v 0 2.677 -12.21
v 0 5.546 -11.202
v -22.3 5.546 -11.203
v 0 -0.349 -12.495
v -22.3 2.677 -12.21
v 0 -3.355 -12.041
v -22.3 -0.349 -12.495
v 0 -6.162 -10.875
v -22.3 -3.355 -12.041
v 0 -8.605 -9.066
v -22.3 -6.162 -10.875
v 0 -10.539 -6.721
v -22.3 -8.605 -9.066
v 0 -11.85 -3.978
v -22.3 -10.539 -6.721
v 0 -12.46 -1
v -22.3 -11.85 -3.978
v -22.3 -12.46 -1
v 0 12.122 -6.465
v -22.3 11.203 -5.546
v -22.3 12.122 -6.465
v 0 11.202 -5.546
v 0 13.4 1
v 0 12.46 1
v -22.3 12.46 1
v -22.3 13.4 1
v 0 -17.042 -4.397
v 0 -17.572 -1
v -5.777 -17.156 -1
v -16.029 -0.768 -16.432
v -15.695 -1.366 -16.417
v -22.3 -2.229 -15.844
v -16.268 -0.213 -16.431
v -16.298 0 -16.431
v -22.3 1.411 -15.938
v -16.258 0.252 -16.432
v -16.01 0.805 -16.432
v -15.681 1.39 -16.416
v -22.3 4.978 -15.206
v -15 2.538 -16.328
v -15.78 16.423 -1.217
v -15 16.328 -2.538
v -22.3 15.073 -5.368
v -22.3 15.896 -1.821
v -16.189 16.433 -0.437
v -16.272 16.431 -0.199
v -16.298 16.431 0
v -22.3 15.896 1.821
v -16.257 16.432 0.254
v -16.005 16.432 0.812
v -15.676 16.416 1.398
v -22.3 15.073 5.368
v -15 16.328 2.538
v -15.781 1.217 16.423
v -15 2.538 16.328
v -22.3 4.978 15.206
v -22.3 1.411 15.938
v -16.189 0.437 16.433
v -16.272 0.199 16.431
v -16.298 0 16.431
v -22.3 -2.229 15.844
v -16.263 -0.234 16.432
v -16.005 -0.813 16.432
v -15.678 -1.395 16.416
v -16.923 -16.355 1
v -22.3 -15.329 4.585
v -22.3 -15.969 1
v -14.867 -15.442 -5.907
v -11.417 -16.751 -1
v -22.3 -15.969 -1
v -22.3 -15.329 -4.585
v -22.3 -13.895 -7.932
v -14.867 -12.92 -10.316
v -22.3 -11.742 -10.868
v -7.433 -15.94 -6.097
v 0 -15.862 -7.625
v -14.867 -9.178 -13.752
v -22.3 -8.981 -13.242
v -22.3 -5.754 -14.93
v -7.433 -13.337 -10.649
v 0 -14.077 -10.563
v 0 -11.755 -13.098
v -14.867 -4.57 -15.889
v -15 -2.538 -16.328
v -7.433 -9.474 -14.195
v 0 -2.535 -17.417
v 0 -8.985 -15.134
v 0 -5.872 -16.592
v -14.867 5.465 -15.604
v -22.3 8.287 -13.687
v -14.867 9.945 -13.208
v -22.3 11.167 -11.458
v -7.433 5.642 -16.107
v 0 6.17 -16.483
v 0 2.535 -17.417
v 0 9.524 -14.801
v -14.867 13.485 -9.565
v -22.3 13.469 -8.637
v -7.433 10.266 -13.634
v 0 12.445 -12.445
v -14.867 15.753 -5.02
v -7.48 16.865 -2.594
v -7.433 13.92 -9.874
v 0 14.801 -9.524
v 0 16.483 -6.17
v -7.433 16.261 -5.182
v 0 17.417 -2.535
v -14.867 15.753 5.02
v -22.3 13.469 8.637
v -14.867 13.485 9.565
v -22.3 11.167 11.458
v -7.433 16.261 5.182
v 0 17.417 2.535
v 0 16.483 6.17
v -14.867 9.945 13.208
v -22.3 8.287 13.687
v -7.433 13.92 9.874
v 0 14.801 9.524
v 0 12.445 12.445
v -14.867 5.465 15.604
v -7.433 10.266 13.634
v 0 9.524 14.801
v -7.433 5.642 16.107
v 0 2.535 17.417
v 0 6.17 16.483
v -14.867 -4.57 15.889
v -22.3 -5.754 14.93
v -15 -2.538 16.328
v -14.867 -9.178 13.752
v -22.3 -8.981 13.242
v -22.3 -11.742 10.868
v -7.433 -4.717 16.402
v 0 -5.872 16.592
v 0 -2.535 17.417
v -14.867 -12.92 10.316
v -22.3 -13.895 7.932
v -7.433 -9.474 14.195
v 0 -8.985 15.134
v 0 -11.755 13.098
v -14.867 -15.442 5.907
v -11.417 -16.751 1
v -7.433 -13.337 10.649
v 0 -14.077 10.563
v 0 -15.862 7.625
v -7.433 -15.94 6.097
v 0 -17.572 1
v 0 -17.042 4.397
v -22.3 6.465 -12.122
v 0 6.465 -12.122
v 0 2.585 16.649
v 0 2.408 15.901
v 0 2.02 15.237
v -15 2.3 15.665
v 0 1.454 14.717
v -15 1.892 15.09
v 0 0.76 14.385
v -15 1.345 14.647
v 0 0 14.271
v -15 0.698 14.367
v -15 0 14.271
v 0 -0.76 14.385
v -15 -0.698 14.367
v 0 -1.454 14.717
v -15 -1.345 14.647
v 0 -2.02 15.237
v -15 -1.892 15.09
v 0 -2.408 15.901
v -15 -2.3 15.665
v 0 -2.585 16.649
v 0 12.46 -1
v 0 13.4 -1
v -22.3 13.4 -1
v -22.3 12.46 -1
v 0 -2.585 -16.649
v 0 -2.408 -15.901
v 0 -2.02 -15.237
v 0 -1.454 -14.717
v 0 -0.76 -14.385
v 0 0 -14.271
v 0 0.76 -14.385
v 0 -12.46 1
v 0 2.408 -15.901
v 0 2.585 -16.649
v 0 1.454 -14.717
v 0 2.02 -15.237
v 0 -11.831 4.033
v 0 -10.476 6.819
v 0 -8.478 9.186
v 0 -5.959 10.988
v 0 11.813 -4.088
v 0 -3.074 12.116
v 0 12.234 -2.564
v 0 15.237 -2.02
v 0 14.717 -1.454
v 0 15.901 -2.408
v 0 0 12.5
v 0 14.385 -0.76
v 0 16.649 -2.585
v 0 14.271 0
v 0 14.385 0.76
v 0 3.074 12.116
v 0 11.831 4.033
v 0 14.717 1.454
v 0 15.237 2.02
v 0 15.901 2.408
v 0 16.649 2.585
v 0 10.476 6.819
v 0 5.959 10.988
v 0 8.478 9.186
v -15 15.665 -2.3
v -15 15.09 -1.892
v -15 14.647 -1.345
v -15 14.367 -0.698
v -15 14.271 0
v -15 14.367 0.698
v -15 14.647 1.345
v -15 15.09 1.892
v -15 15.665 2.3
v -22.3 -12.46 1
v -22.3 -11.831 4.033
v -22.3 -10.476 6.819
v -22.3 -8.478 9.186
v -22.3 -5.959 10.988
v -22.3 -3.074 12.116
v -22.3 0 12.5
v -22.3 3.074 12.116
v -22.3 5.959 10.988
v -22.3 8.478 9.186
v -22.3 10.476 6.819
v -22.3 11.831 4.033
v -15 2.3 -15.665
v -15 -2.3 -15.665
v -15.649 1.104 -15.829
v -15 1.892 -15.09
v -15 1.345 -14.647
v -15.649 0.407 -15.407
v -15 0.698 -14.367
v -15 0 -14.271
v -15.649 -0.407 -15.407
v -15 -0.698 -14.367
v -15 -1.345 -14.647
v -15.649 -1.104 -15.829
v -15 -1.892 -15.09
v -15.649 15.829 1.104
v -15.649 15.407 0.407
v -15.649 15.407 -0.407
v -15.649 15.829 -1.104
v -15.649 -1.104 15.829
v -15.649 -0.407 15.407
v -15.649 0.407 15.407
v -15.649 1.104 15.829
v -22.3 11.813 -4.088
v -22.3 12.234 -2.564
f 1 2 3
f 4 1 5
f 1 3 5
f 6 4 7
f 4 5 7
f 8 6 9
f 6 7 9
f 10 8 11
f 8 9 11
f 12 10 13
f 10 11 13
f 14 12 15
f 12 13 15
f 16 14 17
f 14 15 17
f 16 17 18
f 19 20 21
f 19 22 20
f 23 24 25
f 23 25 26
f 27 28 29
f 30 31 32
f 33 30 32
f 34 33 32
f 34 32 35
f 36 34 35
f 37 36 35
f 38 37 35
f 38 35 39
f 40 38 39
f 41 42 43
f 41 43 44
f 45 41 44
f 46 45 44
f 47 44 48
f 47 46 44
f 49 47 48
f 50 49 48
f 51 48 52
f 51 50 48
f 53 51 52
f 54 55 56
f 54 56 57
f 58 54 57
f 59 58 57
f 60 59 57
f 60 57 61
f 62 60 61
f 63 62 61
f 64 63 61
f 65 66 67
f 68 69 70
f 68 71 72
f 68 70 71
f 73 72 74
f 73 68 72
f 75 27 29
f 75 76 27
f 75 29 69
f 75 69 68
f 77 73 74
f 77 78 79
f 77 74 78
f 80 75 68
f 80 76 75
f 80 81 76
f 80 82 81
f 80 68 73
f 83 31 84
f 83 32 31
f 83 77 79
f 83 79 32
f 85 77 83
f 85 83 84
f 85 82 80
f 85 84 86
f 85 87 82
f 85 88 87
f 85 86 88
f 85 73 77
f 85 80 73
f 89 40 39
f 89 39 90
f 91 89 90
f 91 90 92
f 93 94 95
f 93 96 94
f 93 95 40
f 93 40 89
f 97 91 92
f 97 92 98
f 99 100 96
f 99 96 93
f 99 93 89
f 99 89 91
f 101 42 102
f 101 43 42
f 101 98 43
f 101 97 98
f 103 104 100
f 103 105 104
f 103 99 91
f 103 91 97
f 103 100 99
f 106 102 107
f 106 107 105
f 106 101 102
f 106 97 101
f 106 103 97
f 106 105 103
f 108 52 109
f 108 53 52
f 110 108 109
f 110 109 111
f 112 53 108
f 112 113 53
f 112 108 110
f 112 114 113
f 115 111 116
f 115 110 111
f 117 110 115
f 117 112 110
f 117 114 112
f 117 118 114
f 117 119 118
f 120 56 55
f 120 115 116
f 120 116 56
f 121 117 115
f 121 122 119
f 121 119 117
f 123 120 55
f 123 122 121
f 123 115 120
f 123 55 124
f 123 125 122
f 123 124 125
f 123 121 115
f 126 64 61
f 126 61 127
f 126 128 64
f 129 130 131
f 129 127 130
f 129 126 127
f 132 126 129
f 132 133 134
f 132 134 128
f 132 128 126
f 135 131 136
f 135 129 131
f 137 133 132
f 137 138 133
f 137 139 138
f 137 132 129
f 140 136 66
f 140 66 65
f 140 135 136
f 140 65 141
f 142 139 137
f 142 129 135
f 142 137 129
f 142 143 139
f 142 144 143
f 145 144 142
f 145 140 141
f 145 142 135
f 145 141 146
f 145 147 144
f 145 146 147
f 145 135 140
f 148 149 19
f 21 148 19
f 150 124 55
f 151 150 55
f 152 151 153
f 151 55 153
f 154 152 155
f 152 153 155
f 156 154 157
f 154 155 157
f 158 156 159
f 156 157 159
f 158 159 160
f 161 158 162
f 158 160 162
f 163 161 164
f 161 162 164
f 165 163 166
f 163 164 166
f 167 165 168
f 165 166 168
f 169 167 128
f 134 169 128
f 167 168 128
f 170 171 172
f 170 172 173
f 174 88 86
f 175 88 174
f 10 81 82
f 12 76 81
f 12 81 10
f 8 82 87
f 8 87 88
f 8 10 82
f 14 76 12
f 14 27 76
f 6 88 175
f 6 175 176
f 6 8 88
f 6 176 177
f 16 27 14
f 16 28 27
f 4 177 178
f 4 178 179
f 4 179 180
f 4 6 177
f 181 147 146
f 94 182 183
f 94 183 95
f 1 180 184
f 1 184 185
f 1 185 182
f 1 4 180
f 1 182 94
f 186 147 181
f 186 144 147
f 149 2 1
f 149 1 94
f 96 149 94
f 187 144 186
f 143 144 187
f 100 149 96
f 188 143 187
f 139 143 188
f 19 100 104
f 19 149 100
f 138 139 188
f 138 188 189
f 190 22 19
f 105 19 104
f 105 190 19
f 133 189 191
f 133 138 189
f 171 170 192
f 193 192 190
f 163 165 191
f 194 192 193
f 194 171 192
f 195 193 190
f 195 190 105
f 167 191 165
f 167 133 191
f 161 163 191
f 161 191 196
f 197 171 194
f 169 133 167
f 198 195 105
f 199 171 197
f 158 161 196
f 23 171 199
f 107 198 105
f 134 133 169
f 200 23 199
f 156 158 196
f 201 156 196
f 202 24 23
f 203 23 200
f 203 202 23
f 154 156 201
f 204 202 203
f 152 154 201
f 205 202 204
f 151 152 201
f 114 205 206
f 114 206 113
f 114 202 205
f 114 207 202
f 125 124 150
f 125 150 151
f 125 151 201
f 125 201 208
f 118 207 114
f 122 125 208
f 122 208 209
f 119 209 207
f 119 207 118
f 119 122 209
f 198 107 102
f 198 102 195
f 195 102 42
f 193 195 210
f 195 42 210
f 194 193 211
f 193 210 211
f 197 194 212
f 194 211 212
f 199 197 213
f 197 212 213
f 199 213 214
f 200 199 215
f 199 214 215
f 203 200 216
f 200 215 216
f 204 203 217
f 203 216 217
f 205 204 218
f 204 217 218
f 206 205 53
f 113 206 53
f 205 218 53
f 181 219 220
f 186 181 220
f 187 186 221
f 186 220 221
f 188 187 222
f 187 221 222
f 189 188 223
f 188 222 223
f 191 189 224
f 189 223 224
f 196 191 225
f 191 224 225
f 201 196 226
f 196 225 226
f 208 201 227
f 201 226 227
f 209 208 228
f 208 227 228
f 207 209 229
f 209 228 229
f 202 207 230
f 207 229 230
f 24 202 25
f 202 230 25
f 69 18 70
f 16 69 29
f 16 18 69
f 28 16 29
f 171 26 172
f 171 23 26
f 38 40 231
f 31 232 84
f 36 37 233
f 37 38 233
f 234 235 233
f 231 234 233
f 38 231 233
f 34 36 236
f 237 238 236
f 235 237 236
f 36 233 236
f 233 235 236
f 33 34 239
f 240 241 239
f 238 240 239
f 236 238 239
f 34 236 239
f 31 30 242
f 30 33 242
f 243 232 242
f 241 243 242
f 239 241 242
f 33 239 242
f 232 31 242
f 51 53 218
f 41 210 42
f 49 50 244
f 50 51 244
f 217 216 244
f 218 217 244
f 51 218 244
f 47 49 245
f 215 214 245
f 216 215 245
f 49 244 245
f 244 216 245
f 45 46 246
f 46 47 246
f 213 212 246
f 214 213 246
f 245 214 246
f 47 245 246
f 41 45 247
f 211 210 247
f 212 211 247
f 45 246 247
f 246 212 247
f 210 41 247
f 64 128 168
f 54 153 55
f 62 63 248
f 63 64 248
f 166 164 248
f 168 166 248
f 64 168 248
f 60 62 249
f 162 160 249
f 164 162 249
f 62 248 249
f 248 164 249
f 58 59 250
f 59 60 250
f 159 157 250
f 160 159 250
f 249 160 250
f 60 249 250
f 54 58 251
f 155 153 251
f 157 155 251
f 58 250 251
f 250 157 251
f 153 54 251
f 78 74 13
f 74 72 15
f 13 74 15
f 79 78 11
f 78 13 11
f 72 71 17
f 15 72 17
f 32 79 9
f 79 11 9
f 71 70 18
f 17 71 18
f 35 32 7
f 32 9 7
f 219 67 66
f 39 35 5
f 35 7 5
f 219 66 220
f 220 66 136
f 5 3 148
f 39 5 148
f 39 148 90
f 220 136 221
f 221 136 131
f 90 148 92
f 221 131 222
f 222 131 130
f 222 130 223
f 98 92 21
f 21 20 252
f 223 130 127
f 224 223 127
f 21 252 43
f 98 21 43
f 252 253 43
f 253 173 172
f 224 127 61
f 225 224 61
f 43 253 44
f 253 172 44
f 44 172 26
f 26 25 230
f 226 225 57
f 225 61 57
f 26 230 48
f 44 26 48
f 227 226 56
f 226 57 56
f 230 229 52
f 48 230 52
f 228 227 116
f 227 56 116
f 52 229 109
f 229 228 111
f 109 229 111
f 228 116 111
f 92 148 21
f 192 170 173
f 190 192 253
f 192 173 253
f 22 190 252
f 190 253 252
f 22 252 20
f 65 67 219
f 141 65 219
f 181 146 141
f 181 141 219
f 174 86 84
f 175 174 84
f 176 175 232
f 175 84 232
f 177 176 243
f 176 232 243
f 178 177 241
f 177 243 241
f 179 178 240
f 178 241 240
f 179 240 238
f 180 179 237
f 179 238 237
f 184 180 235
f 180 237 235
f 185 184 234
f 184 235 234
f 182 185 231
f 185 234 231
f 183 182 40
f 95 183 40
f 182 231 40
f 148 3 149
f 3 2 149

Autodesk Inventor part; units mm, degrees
ref_plane "YZ Plane" through (0, 0, 0) normal (1, 0, 0) x (0, 1, 0)
ref_plane "XZ Plane" through (0, 0, 0) normal (0, 1, 0) x (-1, 0, 0)
sketch "Esquisse1" plane through (0, 0, 0) normal (0, 0, 1) x (1, 0, 0)
  line L0 (-36.1898, 0) -> (37.2521, 0)
  line L1 (0, 12.5) -> (-22.3, 12.5)
  line L2 (-22.3, 12.5) -> (-22.3, 16)
  line L3 (-22.3, 16) -> (0, 17.6)
  line L4 (0, 17.6) -> (0, 12.5)
  point P0 (0, 0)
  dimension "d0" = 25
  dimension "d1" = 35.2
  dimension "d2" = 0
  dimension "d3" = 32
  dimension "d4" = 22.3
  dimension "d5" = 0
revolve "Révolution1" add sketch "Esquisse1" angle 360 about axis through (-36.1898, 0, 0) along (1, 0, 0)
sketch "Esquisse4" plane through (0, 0, 0) normal (1, 0, 0) x (0, 0, 1)
  line L0 (0, 0) -> (-39.036, -39.036)
  line L1 (0, 0) -> (-55.3193, 0)
  circle A0 centre (0, 0) radius 12.5 projected
  line L2 (-5.5456, -11.2025) -> (-6.4649, -12.1217)
  line L3 (-11.2025, -5.5456) -> (-12.1217, -6.4649)
  line L4 (-12.1217, -6.4649) -> (-6.4649, -12.1217)
  dimension "d17" = 45
  dimension "d20" = 1.3
  dimension "d21" = 1.3
  dimension "d22" = 4
  dimension "d23" = 4
extrude "Extrusion1" cut sketch "Esquisse4" against normal through all contours A0 L2 L4 L0 | L0 L4 L3 A0
sketch "Esquisse5" plane through (0, 0, 0) normal (1, 0, 0) x (0, 0, 1)
  line L0 (-1, 17.6) -> (1, 17.6)
  line L1 (1, 17.6) -> (1, -13.4)
  line L2 (1, -13.4) -> (-1, -13.4)
  line L3 (-1, -13.4) -> (-1, 17.6)
  line L4 (-1, 17.6) -> (1, -13.4) construction
  line L5 (1, 17.6) -> (-1, -13.4) construction
  arc A0 (0, -17.6) -> (0, -17.6) centre (0, 0) ccw projected
  point P0 (0, 2.1)
  dimension "d26" = 2
  dimension "d27" = 31
  dimension "d28" = 0
extrude "Extrusion2" cut sketch "Esquisse5" against normal through all contours L0 A0 L3 | L0 L1 A0 | A0 L1 L2 L3 picked at (0, -3.0667)
sketch "Esquisse6" plane through (0, 0, 0) normal (1, 0, 0) x (0, 0, -1)
  line L0 (0, 0) -> (0, 23.579)
  line L1 (0, 0) -> (-21.6871, 0)
  line L2 (0, 0) -> (25.1017, 0)
  circle A0 centre (0, 0) radius 16.865
  point P0 (0, 16.865)
  point P1 (16.865, 0)
  point P2 (-16.865, 0)
  dimension "d39" = 33.73
hole "Perçage2" at (0, 16.865, 0) at (0, 0, -16.865) at (0, 0, 16.865) direction (-1, 0, 0) diameter 5.1881 depth 15 tip angle 118 thread size "M6x0.75" class "6H" standard "ANSI Metric M Profile"
properties part number "Douille1008"
